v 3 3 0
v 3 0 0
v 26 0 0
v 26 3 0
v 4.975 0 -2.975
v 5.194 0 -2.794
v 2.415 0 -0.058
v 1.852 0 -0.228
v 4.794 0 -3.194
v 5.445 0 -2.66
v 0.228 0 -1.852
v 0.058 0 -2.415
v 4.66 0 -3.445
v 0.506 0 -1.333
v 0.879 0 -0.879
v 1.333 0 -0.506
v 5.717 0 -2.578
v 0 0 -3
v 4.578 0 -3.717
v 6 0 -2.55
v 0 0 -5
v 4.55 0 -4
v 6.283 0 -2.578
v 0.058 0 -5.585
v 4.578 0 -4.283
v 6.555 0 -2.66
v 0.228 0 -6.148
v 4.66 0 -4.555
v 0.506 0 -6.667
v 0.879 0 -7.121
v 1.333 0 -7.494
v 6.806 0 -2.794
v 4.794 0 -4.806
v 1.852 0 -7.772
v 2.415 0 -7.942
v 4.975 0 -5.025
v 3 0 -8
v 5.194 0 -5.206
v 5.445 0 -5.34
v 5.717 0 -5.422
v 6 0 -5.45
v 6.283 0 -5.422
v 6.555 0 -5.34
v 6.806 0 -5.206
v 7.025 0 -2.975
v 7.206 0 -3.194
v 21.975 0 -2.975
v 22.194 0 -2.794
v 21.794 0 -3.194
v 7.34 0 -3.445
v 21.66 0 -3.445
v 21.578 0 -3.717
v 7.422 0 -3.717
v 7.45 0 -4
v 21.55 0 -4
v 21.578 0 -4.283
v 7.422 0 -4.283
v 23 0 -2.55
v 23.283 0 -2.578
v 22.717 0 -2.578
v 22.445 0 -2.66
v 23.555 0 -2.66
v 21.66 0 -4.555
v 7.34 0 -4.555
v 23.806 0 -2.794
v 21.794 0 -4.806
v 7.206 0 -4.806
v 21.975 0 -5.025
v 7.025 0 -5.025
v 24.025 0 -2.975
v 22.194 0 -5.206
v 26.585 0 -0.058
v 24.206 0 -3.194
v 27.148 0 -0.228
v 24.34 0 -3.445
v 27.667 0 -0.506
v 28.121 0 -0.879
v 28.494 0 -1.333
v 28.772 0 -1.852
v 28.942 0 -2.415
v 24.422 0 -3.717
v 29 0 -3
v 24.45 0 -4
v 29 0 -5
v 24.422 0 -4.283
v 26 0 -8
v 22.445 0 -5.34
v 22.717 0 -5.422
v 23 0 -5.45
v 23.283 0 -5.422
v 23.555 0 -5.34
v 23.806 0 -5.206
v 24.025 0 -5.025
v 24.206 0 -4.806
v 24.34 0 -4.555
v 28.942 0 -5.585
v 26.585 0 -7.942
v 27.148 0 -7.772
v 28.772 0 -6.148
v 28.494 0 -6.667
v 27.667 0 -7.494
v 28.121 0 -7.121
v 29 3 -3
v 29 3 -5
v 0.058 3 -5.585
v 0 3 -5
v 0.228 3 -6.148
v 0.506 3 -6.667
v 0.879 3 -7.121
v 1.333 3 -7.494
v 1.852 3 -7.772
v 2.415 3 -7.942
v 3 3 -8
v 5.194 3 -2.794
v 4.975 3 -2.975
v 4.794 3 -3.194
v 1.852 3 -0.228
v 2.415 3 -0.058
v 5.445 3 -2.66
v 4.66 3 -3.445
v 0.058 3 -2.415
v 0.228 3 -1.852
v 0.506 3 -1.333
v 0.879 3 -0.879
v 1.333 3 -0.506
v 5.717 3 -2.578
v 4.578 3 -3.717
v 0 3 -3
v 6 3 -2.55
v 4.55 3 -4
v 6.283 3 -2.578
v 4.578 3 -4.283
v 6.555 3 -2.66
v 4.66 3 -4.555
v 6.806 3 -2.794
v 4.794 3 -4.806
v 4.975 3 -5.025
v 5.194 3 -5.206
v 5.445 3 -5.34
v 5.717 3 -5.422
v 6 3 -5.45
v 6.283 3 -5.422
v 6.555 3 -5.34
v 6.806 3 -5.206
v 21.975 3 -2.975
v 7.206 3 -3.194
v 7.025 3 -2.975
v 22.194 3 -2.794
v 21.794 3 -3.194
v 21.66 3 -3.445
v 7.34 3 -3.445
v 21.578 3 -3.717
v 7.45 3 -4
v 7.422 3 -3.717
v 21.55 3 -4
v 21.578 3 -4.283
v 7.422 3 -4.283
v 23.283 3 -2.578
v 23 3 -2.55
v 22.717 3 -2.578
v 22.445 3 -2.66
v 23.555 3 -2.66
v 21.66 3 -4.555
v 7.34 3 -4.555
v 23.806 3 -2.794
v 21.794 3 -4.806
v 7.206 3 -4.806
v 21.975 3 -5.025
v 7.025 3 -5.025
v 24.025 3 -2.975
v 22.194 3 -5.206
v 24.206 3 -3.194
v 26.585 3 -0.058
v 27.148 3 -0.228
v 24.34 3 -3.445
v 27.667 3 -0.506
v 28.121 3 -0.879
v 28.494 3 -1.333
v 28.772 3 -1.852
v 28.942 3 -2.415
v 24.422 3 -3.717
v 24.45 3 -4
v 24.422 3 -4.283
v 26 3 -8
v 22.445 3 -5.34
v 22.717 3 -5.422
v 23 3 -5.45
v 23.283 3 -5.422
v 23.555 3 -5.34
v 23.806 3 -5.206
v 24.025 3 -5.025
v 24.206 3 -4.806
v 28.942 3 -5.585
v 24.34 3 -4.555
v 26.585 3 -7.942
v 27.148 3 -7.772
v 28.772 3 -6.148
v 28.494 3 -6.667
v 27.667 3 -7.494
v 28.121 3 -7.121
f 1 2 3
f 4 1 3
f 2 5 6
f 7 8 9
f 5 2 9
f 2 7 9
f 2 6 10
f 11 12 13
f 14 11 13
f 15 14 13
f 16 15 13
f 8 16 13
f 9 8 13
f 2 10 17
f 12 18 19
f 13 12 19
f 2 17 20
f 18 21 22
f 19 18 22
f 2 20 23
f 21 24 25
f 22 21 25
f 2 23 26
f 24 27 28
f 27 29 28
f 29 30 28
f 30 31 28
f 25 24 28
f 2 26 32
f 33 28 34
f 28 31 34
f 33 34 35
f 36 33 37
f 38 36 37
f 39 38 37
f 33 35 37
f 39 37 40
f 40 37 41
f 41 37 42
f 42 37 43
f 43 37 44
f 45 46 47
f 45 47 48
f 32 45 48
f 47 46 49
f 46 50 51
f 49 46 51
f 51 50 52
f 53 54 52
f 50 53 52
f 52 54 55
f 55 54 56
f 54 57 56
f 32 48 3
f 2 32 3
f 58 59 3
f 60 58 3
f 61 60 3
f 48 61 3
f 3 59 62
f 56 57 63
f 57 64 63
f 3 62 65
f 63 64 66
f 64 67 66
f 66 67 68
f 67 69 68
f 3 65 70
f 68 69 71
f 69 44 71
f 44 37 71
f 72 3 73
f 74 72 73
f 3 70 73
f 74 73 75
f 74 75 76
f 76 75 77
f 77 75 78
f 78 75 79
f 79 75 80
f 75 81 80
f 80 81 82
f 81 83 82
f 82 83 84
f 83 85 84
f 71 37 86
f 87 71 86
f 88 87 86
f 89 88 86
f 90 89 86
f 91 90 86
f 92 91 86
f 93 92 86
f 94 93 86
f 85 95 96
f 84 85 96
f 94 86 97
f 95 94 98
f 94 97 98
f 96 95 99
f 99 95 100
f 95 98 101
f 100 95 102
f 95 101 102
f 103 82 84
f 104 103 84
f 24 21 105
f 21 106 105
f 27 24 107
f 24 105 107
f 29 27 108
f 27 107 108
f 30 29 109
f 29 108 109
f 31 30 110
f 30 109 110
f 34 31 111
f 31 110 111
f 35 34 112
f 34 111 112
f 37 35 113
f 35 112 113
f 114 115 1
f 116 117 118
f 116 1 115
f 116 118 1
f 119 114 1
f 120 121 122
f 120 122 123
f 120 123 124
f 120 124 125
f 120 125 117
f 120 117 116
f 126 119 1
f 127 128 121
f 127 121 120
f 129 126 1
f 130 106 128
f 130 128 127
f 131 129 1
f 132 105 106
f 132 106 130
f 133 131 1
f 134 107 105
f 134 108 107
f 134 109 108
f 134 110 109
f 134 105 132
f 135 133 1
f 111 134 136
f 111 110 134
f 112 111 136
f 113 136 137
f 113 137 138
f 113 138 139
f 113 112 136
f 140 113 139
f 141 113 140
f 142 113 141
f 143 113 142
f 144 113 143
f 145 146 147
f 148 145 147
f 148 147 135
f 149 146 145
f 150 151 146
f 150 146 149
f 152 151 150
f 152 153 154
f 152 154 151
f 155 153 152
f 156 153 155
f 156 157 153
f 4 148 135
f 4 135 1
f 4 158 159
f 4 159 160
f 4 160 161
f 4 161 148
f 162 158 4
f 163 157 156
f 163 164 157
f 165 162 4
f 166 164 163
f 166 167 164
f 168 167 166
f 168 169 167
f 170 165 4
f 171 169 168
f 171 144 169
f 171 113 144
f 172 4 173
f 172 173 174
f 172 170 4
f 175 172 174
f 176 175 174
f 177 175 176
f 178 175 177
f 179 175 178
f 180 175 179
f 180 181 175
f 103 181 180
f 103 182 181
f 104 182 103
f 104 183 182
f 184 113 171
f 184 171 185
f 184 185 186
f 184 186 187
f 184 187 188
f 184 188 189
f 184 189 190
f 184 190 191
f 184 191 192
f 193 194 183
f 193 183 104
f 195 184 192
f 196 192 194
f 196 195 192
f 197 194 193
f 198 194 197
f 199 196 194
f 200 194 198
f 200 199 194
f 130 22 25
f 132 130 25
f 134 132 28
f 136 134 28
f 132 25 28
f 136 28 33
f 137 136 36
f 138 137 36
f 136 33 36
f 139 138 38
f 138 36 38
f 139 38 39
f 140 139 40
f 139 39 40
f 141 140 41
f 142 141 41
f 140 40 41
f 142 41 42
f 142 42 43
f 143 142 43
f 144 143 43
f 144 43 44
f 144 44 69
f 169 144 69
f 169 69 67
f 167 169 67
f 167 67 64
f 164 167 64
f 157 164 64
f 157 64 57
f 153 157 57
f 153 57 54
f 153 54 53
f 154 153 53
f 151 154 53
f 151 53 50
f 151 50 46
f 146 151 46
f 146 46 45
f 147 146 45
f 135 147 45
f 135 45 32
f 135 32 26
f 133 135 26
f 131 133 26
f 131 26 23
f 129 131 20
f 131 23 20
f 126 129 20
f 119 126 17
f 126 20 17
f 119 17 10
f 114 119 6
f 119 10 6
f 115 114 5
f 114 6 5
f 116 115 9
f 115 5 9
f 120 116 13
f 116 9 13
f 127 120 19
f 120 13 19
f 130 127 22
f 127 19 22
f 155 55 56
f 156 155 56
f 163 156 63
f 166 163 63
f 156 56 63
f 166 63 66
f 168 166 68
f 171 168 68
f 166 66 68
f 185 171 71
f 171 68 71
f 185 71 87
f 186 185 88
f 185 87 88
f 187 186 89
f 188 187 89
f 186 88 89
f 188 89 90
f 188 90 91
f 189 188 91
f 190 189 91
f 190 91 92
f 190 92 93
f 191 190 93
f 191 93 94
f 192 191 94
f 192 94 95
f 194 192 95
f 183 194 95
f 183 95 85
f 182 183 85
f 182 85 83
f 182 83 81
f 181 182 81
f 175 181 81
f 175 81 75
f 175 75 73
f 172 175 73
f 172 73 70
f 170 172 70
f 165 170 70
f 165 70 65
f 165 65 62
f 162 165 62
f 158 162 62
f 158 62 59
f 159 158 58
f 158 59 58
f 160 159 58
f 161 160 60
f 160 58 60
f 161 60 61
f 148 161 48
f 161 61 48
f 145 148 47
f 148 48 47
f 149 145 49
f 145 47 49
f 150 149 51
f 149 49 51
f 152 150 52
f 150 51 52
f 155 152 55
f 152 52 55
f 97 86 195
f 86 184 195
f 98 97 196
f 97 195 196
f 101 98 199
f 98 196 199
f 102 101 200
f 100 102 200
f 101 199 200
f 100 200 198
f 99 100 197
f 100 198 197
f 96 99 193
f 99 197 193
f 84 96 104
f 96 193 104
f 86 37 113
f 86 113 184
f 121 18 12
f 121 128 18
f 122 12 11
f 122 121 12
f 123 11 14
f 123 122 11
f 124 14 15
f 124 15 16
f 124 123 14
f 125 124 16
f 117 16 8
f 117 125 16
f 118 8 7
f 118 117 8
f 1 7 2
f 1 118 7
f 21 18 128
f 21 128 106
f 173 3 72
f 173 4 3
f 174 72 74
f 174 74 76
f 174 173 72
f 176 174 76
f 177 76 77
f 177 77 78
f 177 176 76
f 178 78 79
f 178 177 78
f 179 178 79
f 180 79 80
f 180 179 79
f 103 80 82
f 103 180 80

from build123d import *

# Parameters (mm, degrees)
SKETCH1_W              = 29
SKETCH1_H              = 8
BOSS_EXTRUDE1_DEPTH    = 3
M2_5_CLEARANCE_HOLE1_D = 2.9
FILLET1_R              = 3


with BuildPart() as part:
    # Sketch1 → Boss-Extrude1 (new body)
    with BuildSketch(Plane(origin=(0, 0, 0), x_dir=(1, 0, 0), z_dir=(0, 1, 0))):
        with Locations((14.5, 4)):
            Rectangle(SKETCH1_W, SKETCH1_H)
    extrude(amount=BOSS_EXTRUDE1_DEPTH)

    # M2.5 Clearance Hole1 (through all)
    with Locations(Plane(origin=(0, 3, 0), x_dir=(1, 0, 0), z_dir=(0, 1, 0))):
        with Locations((6, 4), (23, 4)):
            Hole(M2_5_CLEARANCE_HOLE1_D / 2)

    # Fillet1
    fillet1_edges = [part.edges().sort_by_distance(p)[0] for p in [
        (0, 1.5, -8),
        (29, 1.5, -8),
        (29, 1.5, 0),
        (0, 1.5, 0),
    ]]
    fillet(fillet1_edges, radius=FILLET1_R)


solid = part.part
